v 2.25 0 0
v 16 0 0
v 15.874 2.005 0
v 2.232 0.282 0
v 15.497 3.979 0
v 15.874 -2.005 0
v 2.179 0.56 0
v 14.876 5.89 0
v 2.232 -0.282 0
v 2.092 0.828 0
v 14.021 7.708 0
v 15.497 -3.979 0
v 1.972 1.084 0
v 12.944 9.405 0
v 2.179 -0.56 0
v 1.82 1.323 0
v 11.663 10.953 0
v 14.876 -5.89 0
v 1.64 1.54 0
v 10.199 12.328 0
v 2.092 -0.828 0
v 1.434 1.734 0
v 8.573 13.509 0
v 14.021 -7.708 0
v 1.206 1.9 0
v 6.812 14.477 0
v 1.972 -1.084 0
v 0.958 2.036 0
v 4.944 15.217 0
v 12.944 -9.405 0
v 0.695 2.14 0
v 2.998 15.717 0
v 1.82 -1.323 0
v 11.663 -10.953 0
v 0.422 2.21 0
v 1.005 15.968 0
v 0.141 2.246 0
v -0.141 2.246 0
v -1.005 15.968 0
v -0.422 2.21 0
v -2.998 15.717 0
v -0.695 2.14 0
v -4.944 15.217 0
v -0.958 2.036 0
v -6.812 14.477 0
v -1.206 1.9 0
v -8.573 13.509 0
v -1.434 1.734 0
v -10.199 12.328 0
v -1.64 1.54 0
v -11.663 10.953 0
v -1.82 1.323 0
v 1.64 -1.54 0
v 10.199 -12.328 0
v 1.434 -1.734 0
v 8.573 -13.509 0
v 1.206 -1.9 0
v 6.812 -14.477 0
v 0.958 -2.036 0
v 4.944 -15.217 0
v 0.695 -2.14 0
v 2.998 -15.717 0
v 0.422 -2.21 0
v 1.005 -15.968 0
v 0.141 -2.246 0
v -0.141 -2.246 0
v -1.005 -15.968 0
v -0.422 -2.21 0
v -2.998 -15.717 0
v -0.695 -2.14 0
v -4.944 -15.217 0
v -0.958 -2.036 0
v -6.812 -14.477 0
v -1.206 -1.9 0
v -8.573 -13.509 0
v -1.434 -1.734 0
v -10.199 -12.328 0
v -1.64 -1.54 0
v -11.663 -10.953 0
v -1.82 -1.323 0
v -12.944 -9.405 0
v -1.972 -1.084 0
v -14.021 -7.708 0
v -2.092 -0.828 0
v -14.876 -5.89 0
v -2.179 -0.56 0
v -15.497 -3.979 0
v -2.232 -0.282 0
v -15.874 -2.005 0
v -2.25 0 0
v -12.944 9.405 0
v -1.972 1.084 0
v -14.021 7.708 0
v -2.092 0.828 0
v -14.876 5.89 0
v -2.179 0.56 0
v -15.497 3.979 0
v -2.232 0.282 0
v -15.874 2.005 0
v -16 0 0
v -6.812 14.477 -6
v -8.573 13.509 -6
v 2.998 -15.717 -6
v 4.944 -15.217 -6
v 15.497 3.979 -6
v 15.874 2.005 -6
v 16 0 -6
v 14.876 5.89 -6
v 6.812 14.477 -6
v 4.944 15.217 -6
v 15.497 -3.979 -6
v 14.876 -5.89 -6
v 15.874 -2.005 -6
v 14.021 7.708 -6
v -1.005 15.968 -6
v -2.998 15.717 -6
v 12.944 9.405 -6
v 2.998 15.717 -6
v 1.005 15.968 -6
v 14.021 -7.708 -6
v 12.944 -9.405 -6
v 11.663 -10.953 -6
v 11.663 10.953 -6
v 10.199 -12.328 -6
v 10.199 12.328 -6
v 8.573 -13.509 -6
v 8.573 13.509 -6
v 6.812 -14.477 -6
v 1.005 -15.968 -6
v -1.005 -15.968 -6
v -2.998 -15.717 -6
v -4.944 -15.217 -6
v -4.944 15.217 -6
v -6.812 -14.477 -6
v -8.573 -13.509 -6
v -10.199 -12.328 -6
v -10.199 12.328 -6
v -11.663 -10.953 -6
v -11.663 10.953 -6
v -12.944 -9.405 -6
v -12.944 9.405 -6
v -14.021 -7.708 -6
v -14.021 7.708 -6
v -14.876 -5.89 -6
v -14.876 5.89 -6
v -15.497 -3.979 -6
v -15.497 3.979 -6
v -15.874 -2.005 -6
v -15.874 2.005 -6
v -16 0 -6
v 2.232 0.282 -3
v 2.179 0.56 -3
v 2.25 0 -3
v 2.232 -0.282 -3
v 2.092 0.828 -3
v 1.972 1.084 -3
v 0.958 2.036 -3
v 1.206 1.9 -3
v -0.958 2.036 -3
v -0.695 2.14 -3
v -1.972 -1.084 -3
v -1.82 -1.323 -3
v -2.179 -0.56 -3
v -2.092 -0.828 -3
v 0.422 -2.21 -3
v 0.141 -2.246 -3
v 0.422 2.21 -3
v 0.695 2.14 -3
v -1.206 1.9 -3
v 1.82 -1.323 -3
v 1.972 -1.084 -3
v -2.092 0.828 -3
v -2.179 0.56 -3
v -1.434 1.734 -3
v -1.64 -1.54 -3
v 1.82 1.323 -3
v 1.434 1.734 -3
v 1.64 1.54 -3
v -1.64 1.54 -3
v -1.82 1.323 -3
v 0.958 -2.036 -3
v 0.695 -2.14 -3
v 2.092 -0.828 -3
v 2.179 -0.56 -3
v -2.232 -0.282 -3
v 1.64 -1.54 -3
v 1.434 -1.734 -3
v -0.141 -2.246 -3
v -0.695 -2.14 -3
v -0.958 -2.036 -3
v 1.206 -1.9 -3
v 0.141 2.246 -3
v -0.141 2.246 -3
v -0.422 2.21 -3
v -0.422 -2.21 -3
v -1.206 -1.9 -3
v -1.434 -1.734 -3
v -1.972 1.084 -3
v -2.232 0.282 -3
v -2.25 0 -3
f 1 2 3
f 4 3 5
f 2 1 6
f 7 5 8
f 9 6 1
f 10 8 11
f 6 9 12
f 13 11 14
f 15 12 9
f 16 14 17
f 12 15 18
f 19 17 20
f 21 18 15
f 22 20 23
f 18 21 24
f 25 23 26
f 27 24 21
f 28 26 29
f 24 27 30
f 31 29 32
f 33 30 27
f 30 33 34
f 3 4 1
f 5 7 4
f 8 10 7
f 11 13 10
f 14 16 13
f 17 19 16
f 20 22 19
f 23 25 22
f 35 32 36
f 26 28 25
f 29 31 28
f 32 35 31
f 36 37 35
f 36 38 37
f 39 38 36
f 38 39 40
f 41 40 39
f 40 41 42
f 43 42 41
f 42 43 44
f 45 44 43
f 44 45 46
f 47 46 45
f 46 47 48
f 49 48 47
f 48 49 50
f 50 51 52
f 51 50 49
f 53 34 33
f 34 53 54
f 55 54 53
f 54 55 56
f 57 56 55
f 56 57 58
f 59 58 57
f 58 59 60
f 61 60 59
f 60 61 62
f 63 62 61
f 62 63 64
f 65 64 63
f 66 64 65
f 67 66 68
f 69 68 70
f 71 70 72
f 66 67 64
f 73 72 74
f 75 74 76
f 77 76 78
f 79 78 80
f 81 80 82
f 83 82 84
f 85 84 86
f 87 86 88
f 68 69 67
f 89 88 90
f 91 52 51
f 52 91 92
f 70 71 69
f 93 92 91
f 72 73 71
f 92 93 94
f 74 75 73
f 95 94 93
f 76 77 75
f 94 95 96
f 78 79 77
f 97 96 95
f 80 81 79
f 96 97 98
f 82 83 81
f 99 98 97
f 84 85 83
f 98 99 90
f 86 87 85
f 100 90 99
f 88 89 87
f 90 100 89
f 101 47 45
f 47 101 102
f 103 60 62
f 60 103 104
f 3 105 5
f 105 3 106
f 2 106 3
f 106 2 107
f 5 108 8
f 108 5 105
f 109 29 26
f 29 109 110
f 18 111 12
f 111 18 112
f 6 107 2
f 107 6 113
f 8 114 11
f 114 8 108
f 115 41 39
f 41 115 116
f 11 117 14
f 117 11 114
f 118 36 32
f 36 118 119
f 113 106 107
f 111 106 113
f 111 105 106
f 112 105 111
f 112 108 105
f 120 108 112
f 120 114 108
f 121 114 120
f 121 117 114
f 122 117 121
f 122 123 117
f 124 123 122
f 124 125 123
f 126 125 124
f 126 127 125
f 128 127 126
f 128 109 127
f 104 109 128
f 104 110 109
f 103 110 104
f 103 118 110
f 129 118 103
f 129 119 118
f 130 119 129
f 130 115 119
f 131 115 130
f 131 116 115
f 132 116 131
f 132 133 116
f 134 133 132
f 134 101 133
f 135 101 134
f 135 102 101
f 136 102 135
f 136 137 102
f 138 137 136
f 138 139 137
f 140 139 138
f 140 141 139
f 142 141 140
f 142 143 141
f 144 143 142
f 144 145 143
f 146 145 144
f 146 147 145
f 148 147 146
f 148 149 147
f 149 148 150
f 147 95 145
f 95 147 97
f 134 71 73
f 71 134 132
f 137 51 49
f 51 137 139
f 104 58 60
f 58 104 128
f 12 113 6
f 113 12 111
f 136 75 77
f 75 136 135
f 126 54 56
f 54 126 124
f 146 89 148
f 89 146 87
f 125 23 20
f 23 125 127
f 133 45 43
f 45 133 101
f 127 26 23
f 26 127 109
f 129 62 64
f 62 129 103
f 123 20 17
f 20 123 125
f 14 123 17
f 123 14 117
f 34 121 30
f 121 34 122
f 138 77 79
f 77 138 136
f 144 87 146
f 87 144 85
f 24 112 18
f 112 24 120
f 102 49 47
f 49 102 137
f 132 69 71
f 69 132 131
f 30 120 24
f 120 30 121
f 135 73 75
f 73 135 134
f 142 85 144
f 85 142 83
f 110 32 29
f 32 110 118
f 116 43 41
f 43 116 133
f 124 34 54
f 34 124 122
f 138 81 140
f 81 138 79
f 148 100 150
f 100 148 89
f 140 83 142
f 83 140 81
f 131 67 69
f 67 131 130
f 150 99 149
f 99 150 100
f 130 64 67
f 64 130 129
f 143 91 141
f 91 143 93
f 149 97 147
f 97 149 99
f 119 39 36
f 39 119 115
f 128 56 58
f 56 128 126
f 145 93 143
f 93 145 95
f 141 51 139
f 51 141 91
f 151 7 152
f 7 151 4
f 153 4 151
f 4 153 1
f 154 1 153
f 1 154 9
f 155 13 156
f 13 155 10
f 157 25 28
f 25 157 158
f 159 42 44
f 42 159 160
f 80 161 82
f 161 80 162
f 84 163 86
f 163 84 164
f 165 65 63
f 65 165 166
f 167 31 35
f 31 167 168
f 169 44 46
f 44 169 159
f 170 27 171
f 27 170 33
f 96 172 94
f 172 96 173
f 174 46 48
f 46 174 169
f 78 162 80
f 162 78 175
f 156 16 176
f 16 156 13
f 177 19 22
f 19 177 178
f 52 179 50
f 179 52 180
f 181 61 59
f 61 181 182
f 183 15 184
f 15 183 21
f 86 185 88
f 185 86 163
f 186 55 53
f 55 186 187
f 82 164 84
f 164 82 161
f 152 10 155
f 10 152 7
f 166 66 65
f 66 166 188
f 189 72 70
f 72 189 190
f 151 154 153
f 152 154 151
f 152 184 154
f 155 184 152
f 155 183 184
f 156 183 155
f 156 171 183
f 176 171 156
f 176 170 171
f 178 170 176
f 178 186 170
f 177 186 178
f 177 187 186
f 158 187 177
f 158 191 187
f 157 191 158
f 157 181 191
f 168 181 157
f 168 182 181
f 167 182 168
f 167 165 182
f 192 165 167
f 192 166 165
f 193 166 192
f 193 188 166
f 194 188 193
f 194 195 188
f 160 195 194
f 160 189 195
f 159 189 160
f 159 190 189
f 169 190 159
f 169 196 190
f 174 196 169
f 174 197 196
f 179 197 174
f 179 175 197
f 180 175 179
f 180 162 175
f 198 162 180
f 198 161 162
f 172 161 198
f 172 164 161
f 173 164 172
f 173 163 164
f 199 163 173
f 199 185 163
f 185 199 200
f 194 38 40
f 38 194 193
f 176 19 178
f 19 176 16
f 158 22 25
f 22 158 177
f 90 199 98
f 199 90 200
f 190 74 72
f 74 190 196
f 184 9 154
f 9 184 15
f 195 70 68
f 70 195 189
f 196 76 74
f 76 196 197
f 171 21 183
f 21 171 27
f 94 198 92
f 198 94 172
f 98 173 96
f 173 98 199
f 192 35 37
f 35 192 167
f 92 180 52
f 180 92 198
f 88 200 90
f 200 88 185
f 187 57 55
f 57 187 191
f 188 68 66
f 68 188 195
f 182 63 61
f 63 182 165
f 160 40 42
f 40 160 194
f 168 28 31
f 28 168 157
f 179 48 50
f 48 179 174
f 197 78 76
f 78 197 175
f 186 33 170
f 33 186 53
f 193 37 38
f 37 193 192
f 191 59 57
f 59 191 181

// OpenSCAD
$fn = 50;


difference() {
	union() {
		translate(v = [0, 0, -3.0000000000]) {
			cylinder(h = 3, r = 7.0000000000);
		}
		translate(v = [0, 0, -6.0000000000]) {
			cylinder(h = 6, r = 16.0000000000);
		}
	}
	union() {
		#translate(v = [0, 0, -3]) {
			cylinder(h = 3, r = 2.2500000000);
		}
	}
}
